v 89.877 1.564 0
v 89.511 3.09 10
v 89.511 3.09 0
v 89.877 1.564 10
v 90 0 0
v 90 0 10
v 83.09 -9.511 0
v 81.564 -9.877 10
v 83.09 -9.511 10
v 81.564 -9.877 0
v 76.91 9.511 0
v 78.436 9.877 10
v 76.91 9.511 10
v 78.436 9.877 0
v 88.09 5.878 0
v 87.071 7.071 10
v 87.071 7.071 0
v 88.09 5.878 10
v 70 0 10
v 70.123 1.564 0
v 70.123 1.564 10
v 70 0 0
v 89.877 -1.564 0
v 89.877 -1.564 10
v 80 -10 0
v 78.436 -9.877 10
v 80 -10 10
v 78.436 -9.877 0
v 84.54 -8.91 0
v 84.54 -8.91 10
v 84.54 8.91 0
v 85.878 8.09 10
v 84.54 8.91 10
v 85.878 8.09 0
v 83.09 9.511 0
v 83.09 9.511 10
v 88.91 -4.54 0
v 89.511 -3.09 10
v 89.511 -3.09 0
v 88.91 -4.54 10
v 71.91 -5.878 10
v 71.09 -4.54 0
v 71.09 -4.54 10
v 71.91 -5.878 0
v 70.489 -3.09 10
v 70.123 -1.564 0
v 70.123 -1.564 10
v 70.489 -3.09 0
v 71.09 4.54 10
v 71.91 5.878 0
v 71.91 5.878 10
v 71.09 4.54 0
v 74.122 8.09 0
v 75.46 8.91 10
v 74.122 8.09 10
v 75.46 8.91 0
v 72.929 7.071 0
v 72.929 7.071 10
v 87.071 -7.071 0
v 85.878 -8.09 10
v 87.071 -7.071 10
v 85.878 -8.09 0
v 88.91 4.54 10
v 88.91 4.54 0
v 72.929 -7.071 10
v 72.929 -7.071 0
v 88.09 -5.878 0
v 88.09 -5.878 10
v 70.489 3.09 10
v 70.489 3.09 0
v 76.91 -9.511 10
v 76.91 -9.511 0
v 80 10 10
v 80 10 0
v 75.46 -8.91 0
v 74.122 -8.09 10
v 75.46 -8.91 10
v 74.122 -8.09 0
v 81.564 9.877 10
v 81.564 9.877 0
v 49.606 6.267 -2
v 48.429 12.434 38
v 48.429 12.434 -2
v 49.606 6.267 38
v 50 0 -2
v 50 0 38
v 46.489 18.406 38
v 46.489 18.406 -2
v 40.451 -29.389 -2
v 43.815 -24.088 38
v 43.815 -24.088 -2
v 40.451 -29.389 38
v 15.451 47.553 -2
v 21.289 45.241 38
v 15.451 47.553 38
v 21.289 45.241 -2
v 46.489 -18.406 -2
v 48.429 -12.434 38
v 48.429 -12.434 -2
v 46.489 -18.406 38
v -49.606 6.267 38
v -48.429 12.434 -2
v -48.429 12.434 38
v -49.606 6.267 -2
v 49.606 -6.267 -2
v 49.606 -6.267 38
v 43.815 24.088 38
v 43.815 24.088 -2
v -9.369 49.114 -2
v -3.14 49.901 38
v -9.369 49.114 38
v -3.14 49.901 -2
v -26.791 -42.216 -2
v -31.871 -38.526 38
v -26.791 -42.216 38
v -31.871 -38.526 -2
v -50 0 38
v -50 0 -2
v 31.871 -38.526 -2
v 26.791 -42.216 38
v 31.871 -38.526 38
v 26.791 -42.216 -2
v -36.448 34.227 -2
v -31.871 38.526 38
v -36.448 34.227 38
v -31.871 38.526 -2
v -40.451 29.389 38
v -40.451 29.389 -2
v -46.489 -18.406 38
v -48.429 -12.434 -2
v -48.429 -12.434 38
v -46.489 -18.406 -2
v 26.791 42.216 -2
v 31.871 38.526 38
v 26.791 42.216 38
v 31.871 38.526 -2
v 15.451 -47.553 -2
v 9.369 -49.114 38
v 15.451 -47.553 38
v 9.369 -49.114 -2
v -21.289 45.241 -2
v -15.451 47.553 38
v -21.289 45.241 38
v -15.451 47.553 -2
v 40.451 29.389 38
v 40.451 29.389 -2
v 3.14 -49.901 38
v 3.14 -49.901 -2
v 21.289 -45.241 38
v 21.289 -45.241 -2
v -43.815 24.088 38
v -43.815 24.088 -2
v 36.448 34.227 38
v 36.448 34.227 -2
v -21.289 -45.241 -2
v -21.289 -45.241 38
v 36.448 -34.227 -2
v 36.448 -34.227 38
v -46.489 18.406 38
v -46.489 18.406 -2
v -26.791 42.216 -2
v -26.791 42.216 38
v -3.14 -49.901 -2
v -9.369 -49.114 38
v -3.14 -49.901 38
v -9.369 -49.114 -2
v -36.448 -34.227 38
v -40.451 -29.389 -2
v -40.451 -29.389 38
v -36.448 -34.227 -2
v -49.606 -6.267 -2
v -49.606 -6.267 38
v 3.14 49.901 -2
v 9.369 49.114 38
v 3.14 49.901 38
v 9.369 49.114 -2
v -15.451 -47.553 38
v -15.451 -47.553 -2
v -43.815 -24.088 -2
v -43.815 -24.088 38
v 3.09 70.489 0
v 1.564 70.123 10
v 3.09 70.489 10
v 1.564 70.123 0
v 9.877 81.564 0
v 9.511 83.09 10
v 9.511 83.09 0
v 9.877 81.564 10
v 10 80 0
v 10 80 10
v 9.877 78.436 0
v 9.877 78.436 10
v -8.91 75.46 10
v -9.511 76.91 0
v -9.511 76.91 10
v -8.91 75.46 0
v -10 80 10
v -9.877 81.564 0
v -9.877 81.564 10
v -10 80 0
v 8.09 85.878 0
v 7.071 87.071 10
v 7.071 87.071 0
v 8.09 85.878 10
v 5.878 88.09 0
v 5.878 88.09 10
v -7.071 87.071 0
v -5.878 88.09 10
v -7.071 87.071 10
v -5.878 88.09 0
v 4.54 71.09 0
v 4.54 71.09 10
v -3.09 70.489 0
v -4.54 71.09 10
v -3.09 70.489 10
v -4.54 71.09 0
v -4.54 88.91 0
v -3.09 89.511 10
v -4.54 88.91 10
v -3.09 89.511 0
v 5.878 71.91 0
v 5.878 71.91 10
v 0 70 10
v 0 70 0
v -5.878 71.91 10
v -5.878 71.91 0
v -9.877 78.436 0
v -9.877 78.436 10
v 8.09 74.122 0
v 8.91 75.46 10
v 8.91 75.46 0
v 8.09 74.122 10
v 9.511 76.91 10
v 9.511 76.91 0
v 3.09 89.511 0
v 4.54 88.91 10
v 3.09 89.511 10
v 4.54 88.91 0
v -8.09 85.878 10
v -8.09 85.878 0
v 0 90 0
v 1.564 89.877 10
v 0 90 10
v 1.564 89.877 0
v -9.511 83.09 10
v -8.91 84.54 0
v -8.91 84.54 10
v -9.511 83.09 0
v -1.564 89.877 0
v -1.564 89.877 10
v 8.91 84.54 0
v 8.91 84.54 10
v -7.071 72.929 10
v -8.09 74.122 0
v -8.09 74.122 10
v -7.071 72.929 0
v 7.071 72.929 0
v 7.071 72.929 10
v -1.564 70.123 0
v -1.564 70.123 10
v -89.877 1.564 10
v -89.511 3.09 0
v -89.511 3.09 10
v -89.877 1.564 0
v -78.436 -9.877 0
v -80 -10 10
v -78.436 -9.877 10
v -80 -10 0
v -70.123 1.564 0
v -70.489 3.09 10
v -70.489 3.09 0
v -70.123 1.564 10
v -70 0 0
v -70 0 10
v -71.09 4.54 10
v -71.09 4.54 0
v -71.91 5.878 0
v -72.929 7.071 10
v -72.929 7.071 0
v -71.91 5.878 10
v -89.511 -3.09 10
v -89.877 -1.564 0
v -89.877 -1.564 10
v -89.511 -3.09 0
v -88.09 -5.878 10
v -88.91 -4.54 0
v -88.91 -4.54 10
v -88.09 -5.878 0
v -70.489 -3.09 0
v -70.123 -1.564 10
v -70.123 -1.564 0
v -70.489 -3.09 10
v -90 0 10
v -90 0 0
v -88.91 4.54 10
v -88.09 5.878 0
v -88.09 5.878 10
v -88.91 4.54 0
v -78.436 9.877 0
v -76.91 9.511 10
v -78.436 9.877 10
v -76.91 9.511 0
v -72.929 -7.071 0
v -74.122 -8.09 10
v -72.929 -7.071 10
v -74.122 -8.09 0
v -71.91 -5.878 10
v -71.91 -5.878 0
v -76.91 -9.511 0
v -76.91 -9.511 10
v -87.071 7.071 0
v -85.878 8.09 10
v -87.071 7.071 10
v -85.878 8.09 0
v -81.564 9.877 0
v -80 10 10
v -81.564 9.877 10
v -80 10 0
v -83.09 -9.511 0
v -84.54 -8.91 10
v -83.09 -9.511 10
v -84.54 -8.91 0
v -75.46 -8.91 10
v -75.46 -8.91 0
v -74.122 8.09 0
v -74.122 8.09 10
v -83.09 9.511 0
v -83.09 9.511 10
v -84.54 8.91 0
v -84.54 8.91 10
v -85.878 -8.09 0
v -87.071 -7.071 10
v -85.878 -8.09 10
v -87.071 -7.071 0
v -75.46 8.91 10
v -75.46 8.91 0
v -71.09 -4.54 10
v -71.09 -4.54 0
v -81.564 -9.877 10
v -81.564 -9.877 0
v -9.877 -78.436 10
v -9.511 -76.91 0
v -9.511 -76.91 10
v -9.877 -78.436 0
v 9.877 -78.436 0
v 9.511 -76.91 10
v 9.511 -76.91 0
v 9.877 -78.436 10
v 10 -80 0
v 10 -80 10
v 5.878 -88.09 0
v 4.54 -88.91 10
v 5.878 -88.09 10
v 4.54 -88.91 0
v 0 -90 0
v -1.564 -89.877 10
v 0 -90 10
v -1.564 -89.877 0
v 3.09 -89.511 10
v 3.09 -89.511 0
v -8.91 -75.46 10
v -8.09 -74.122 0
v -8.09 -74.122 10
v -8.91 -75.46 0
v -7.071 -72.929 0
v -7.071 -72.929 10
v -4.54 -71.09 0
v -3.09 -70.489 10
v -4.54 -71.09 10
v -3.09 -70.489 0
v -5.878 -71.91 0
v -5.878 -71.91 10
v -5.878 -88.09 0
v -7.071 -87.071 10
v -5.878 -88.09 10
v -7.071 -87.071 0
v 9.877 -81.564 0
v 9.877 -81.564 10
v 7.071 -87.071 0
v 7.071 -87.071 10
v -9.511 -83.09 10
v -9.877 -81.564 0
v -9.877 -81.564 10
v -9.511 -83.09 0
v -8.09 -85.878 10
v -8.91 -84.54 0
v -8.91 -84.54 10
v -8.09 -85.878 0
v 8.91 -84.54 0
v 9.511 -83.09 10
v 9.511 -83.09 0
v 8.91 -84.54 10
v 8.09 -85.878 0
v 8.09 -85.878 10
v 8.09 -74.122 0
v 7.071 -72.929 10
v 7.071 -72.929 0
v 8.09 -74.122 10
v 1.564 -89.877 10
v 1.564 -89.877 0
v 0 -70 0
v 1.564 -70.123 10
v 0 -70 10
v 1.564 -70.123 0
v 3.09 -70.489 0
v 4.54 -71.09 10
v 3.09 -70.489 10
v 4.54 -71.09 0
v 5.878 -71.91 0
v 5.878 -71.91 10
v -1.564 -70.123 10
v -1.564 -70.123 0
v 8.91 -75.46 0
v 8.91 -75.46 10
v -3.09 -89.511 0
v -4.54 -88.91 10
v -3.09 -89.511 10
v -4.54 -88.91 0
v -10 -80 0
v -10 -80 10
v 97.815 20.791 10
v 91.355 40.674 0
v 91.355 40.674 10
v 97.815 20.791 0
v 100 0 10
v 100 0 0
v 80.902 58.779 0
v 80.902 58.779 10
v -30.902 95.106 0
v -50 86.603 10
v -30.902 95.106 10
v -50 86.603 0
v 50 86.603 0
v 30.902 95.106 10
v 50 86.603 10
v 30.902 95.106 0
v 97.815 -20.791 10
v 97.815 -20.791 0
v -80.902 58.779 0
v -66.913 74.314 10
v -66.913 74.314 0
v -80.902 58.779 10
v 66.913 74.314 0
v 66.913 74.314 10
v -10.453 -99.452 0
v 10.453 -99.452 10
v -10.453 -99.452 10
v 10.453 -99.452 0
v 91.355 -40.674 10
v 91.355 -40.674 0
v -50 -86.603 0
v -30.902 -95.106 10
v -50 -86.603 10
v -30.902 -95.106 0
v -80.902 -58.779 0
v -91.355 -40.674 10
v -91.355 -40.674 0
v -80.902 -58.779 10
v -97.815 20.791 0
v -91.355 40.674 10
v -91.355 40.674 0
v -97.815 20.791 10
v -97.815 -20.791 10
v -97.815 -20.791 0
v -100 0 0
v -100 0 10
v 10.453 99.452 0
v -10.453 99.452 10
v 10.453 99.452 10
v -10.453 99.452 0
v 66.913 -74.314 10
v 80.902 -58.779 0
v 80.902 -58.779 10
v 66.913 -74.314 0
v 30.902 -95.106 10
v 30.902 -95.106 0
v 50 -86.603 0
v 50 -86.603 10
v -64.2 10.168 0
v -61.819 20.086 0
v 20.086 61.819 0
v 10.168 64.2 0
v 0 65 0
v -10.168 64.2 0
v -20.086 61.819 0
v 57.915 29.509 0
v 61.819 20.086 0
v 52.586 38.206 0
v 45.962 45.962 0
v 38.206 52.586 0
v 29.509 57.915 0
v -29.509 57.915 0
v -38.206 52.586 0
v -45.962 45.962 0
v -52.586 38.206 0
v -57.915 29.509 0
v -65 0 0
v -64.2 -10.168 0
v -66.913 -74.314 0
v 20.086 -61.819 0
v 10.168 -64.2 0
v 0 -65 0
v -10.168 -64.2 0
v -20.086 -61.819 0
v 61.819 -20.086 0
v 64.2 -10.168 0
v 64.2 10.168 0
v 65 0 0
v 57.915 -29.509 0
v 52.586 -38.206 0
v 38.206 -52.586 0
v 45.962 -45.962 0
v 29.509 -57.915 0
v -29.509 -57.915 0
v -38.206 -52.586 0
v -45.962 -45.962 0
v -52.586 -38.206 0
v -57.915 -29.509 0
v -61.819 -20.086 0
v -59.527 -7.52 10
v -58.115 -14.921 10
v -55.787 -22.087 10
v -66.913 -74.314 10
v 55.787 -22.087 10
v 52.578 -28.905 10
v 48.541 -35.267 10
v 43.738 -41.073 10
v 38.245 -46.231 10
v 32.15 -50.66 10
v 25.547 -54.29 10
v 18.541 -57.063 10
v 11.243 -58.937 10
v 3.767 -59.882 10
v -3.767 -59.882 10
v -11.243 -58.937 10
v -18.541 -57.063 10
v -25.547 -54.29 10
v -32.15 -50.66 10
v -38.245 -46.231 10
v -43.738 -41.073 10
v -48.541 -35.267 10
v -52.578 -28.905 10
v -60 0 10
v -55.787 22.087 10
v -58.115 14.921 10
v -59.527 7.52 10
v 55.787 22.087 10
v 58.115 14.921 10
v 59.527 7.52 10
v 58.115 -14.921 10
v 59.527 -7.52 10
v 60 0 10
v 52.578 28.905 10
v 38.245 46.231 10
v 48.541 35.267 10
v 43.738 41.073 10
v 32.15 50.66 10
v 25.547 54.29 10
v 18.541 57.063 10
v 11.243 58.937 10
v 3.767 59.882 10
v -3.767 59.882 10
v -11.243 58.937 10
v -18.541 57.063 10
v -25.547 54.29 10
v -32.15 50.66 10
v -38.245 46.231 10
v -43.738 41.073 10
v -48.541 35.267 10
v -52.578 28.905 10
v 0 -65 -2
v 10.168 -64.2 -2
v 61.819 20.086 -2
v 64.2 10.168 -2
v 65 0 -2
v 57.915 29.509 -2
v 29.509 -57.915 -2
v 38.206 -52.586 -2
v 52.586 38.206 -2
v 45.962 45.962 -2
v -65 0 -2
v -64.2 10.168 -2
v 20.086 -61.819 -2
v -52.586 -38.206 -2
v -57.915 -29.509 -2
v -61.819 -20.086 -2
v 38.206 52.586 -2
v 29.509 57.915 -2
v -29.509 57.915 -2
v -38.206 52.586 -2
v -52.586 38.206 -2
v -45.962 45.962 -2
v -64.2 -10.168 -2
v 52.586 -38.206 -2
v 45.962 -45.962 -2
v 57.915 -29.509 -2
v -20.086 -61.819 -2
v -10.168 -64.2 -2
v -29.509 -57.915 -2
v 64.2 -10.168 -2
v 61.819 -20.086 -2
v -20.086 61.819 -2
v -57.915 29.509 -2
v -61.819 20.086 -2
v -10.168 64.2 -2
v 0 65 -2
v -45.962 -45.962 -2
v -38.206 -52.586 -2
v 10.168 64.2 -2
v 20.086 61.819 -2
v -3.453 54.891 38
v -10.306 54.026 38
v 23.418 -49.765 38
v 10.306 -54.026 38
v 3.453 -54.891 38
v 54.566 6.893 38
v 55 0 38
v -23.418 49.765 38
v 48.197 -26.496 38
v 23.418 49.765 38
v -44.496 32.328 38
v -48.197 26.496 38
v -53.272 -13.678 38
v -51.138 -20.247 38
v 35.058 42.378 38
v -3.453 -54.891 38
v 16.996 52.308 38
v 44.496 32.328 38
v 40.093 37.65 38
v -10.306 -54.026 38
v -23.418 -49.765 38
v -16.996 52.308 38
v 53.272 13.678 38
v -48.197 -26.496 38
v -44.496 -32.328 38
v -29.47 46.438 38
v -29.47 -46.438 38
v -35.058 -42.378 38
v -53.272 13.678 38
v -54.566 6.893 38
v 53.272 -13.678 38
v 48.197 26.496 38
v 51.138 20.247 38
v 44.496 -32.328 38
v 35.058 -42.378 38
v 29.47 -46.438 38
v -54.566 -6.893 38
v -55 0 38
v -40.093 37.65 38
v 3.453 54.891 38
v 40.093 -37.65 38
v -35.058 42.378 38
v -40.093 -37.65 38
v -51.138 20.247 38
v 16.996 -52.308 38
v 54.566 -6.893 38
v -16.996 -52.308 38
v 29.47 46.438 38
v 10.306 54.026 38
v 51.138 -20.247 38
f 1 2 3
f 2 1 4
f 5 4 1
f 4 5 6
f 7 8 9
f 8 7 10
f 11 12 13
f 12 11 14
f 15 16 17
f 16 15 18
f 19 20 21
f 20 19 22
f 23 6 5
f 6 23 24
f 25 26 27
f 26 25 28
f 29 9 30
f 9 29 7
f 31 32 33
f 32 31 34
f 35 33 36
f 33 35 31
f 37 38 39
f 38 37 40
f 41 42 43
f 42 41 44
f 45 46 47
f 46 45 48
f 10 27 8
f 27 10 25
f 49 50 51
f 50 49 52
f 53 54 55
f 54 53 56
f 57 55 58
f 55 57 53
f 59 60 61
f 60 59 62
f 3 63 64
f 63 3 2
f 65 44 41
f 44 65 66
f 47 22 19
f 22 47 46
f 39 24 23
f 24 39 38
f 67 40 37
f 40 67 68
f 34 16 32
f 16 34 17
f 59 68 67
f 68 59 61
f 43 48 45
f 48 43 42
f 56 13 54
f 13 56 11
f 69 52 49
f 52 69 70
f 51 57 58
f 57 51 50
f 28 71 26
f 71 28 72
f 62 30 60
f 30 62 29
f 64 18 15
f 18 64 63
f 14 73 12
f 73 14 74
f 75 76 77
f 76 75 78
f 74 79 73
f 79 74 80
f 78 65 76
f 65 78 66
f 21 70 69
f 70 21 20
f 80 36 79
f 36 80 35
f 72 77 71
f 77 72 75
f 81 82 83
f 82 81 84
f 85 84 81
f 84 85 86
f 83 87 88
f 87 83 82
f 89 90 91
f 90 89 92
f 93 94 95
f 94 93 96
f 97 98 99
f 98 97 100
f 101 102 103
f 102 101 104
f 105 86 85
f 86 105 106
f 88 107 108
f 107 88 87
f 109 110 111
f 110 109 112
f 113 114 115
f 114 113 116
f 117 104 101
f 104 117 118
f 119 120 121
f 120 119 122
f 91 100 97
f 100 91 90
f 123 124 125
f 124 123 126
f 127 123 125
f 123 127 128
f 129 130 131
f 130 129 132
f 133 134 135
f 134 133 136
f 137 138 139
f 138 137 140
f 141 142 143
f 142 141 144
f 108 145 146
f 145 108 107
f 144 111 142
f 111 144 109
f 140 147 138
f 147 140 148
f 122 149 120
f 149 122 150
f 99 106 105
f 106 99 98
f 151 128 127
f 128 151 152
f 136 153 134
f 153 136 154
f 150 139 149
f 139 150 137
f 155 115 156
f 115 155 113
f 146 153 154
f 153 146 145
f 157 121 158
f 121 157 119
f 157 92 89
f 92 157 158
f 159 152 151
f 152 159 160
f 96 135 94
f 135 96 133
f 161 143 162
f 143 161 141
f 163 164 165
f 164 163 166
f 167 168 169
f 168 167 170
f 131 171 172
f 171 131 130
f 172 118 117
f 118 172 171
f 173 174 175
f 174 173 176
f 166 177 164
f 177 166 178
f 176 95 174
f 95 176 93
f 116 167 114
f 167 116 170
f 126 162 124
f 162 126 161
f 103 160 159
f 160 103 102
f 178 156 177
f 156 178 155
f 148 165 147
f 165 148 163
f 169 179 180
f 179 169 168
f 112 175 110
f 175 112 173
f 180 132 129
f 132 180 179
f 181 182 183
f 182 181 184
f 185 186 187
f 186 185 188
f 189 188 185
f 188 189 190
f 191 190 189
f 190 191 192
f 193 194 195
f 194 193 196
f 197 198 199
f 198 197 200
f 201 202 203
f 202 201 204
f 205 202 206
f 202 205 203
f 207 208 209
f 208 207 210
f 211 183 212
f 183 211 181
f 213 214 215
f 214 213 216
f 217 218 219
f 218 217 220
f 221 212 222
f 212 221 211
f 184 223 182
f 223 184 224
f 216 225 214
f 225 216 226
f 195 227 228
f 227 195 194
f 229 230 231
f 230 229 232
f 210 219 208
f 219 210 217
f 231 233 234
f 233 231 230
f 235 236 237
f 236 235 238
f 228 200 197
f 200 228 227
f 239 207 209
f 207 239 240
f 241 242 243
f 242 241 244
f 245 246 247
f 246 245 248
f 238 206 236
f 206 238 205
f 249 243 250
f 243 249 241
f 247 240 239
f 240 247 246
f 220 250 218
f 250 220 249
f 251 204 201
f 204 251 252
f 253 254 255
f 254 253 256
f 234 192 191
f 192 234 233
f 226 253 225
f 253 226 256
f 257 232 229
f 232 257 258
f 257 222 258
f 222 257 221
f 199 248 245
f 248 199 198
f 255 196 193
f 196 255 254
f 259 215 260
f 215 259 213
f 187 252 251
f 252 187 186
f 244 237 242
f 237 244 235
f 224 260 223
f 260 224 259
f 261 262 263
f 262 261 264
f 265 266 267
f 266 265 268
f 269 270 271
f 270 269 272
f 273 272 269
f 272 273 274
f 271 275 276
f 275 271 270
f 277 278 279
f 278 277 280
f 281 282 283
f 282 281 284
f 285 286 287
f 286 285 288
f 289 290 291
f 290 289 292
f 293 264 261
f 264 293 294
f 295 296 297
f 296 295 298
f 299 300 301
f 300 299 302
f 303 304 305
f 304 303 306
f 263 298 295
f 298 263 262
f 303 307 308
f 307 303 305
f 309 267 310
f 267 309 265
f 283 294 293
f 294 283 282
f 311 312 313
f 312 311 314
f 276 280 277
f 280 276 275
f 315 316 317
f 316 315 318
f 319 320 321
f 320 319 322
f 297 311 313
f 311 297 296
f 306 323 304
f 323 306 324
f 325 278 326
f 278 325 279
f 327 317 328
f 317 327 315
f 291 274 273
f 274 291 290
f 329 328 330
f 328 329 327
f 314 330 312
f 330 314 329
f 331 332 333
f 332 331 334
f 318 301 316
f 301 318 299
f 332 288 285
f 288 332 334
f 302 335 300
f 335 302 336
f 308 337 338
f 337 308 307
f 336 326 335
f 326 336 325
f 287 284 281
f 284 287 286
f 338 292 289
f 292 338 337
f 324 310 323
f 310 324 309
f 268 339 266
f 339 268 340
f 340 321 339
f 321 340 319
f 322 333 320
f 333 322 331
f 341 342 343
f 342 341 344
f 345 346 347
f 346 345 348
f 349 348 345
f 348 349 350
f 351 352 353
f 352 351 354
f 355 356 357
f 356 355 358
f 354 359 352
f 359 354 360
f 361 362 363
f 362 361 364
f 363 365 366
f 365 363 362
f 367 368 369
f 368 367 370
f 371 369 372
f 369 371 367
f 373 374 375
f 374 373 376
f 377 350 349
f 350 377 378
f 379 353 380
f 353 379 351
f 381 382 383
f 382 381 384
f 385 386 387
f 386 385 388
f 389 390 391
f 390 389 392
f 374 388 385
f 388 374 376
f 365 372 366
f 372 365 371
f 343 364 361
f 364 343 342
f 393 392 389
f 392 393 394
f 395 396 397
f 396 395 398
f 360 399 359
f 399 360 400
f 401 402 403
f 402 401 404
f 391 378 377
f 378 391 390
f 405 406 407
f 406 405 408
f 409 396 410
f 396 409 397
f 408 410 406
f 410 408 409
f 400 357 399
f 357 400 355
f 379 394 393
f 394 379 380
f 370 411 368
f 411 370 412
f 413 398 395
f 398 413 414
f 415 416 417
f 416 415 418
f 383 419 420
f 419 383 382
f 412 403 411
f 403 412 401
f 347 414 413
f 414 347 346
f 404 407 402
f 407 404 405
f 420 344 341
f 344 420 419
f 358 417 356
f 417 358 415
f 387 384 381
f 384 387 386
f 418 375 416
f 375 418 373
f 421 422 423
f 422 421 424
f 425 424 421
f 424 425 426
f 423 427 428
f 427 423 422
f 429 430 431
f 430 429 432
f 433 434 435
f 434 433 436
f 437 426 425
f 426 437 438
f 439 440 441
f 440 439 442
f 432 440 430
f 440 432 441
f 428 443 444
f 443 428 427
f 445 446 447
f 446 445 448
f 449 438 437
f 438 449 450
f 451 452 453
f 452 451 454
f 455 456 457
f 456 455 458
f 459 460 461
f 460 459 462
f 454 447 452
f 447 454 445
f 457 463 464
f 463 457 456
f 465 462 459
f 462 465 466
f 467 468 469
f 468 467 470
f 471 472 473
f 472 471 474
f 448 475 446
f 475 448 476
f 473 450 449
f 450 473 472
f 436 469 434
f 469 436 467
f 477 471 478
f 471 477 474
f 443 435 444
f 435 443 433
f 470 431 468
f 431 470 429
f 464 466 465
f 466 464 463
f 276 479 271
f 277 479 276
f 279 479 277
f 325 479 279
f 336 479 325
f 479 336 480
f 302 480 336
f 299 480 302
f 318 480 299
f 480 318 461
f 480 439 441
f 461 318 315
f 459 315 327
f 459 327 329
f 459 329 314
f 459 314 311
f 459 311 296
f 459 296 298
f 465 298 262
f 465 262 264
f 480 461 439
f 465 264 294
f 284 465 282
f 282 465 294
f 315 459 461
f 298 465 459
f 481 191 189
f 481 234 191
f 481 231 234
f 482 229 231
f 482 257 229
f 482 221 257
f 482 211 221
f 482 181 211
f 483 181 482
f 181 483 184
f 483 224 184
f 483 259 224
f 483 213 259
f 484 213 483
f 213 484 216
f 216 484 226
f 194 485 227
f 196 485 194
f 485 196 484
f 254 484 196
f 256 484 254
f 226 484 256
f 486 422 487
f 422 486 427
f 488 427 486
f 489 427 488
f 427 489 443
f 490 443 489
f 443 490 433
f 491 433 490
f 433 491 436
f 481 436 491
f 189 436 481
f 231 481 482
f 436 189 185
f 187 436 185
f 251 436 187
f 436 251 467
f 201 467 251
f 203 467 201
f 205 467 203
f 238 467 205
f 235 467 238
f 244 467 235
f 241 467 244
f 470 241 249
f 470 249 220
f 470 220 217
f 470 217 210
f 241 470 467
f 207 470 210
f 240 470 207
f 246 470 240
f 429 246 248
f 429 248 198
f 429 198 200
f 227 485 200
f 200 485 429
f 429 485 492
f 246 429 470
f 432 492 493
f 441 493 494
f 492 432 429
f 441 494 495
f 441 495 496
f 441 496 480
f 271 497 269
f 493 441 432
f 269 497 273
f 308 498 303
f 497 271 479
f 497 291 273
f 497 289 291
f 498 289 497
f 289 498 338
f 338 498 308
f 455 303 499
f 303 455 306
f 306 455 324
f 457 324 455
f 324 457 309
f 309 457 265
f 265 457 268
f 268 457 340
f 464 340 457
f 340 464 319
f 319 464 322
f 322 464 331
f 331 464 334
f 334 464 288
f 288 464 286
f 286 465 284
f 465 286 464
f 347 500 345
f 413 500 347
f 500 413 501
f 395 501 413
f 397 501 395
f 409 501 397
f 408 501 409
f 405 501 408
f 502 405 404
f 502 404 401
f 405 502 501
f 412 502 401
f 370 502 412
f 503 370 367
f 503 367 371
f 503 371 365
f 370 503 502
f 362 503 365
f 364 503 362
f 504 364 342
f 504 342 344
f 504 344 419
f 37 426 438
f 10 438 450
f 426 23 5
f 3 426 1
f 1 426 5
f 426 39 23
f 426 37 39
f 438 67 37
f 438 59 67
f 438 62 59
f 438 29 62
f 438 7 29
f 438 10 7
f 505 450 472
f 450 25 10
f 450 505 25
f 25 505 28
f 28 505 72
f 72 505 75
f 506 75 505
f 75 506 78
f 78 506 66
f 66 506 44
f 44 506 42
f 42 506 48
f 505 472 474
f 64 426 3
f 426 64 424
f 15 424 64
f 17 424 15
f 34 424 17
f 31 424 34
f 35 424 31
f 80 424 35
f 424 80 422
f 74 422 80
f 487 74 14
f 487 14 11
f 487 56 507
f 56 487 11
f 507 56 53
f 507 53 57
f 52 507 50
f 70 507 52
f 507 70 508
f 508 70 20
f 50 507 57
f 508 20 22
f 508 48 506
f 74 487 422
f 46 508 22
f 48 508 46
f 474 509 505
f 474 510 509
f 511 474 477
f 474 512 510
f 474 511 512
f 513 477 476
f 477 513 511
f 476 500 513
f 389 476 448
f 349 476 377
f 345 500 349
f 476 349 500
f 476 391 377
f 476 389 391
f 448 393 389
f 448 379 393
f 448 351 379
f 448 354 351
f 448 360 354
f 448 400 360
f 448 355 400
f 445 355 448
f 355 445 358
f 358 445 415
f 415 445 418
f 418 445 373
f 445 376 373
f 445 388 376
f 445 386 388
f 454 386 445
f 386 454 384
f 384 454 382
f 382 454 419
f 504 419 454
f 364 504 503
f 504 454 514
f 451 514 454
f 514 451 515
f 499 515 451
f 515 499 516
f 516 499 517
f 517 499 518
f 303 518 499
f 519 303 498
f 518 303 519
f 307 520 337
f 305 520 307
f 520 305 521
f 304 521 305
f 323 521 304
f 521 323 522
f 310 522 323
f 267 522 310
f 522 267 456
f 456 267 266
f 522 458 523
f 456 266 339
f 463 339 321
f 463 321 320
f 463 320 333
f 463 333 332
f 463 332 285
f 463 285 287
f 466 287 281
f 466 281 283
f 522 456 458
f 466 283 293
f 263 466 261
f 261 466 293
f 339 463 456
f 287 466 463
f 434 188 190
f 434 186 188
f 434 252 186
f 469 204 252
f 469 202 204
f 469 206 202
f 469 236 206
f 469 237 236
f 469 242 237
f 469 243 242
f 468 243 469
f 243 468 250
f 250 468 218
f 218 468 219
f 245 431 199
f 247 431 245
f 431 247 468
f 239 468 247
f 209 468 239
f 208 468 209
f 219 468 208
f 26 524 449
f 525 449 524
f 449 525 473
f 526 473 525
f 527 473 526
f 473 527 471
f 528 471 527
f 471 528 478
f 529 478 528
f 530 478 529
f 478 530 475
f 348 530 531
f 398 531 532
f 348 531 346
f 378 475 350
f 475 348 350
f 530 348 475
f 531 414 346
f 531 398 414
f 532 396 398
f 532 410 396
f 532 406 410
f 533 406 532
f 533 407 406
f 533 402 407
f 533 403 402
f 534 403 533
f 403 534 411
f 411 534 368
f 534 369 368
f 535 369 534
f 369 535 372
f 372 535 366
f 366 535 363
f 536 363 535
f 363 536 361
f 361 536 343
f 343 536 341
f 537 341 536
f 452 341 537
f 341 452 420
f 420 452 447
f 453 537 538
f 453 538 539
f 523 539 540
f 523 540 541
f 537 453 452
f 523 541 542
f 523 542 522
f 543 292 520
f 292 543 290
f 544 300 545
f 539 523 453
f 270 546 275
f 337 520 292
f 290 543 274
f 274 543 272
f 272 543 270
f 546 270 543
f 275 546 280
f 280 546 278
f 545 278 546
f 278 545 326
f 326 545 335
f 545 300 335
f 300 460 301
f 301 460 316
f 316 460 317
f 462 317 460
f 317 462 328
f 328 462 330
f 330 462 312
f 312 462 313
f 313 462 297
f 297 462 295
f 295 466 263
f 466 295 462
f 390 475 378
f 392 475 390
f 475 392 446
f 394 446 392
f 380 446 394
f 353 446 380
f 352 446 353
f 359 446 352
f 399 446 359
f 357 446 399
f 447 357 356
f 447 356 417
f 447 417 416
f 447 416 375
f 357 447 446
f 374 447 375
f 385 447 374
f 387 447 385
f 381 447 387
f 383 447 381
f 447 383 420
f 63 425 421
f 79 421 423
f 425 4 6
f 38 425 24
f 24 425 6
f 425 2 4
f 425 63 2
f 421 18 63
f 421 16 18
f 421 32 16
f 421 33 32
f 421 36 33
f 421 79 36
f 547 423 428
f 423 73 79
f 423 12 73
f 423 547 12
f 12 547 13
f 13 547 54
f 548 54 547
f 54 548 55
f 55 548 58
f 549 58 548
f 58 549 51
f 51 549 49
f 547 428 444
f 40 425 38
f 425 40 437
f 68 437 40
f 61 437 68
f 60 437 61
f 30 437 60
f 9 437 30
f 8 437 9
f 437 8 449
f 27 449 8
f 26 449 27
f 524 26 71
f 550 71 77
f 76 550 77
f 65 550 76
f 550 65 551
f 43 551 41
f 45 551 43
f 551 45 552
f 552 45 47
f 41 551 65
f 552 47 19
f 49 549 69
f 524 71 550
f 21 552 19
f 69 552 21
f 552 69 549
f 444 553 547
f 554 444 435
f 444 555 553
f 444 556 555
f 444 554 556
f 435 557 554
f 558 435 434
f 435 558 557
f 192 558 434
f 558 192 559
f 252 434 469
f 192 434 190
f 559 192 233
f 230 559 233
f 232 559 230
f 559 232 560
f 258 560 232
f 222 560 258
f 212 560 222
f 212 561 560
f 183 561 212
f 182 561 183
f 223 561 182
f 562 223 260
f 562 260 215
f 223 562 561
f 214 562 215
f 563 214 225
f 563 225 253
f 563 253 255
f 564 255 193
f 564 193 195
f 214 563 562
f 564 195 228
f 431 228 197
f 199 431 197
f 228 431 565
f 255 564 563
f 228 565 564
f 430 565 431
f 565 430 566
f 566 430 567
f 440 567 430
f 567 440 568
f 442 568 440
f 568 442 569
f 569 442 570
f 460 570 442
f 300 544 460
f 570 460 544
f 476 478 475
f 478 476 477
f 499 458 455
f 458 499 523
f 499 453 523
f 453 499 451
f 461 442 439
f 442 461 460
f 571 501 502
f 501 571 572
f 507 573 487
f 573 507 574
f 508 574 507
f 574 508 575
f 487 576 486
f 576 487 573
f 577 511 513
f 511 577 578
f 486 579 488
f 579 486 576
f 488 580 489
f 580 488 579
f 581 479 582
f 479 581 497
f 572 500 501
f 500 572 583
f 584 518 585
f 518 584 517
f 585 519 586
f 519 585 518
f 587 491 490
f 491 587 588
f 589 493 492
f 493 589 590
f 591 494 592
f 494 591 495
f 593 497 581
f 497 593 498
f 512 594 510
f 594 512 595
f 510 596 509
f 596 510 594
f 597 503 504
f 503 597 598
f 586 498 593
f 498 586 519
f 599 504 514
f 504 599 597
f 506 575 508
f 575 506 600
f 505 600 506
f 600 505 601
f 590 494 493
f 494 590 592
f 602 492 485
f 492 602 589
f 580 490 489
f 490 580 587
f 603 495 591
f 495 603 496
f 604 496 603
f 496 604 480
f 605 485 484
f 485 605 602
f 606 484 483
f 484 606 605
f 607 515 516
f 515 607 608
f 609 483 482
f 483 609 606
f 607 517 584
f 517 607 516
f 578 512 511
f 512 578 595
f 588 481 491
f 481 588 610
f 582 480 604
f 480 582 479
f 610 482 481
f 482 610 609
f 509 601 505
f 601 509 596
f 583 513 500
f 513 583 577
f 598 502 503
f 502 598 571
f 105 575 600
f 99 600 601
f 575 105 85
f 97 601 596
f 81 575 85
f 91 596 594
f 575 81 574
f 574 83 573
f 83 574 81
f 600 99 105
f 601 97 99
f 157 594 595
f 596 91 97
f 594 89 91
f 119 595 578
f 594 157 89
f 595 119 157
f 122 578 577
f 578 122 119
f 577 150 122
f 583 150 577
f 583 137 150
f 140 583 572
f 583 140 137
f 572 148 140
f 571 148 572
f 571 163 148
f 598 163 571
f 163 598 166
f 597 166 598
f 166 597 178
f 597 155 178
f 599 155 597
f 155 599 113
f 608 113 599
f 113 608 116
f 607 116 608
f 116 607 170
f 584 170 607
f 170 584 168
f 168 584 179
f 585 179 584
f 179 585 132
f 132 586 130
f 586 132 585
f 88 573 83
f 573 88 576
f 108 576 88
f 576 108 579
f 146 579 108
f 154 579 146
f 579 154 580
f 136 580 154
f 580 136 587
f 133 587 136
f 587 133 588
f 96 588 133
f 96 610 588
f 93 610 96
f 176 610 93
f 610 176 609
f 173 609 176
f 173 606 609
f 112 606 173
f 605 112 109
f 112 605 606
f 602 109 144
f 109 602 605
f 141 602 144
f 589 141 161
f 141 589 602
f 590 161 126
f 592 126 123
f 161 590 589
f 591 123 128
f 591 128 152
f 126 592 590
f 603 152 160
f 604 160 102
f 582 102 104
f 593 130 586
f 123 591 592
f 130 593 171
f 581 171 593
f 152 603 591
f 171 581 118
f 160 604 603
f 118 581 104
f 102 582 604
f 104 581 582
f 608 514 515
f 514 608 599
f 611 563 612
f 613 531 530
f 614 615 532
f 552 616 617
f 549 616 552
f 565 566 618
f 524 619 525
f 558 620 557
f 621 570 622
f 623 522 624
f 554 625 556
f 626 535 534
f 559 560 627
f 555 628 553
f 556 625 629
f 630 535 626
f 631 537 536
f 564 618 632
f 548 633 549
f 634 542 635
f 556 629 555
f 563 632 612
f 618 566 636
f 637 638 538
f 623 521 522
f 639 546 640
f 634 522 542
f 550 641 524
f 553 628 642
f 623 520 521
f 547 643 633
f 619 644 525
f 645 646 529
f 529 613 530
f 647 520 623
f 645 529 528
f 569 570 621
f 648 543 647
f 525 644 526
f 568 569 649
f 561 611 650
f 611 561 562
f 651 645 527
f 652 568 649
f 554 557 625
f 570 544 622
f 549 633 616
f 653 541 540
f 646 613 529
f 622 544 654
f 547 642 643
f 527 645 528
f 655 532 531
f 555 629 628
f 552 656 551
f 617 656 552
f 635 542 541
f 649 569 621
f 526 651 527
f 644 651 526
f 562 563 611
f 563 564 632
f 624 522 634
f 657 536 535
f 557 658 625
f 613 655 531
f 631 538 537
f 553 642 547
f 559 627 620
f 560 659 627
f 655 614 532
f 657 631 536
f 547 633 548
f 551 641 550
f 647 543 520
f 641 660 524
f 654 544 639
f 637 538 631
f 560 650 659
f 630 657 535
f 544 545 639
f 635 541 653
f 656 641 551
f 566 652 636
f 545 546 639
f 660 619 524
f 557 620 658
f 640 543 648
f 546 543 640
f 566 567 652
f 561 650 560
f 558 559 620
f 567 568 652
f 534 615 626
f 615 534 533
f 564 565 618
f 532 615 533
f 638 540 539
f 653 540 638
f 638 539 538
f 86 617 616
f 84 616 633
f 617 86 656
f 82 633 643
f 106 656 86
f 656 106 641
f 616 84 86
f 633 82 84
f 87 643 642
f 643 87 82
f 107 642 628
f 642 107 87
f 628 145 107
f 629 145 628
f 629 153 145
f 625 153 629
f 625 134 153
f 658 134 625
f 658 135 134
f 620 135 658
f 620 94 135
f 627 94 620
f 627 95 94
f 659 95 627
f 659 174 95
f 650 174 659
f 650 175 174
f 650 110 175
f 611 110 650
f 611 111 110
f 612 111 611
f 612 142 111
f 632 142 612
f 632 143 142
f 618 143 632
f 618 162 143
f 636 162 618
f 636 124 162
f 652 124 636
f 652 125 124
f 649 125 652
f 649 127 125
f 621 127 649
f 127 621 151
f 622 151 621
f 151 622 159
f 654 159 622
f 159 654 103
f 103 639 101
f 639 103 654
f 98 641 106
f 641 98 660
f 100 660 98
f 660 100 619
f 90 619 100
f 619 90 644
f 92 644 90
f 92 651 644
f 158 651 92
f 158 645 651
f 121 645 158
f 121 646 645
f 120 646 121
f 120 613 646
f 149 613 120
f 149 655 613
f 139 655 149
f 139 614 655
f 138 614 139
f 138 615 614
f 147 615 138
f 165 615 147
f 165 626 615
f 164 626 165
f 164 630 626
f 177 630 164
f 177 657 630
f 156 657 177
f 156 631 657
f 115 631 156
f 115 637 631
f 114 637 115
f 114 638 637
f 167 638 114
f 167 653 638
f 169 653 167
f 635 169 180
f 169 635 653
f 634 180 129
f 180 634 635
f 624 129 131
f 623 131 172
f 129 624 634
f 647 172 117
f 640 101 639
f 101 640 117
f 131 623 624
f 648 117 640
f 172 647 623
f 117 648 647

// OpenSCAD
Flange_Height = 10;
Total_Height = 38;
Step_Height = 2;
Hole_Diameter = 10; 
Hole_Center_Distance = 100;

color("lime",1.0){
    difference(){

        union(){
            translate([0,0,- Step_Height]){ 
            cylinder(Step_Height,65,65,$fn=40);
            }

            difference(){
            cylinder(Flange_Height,100,100,$fn=30);
            
            r = 80;
            // Flange Holes
            for (i=[0:90:359]) {
                translate([r*cos(i),r*sin(i),-1])
                cylinder(12,10,10,$fn=40);
             
                translate([0,0,-1]) 
                cylinder(12,50,50,$fn=50);  
                }
            }
        translate([0,0,Flange_Height]) 
        cylinder(Total_Height - Flange_Height,60,55,$fn=50);    
        }
     
       
        translate([0,0,-10]) 
        cylinder(100,50,50,$fn=50);
    }
}
